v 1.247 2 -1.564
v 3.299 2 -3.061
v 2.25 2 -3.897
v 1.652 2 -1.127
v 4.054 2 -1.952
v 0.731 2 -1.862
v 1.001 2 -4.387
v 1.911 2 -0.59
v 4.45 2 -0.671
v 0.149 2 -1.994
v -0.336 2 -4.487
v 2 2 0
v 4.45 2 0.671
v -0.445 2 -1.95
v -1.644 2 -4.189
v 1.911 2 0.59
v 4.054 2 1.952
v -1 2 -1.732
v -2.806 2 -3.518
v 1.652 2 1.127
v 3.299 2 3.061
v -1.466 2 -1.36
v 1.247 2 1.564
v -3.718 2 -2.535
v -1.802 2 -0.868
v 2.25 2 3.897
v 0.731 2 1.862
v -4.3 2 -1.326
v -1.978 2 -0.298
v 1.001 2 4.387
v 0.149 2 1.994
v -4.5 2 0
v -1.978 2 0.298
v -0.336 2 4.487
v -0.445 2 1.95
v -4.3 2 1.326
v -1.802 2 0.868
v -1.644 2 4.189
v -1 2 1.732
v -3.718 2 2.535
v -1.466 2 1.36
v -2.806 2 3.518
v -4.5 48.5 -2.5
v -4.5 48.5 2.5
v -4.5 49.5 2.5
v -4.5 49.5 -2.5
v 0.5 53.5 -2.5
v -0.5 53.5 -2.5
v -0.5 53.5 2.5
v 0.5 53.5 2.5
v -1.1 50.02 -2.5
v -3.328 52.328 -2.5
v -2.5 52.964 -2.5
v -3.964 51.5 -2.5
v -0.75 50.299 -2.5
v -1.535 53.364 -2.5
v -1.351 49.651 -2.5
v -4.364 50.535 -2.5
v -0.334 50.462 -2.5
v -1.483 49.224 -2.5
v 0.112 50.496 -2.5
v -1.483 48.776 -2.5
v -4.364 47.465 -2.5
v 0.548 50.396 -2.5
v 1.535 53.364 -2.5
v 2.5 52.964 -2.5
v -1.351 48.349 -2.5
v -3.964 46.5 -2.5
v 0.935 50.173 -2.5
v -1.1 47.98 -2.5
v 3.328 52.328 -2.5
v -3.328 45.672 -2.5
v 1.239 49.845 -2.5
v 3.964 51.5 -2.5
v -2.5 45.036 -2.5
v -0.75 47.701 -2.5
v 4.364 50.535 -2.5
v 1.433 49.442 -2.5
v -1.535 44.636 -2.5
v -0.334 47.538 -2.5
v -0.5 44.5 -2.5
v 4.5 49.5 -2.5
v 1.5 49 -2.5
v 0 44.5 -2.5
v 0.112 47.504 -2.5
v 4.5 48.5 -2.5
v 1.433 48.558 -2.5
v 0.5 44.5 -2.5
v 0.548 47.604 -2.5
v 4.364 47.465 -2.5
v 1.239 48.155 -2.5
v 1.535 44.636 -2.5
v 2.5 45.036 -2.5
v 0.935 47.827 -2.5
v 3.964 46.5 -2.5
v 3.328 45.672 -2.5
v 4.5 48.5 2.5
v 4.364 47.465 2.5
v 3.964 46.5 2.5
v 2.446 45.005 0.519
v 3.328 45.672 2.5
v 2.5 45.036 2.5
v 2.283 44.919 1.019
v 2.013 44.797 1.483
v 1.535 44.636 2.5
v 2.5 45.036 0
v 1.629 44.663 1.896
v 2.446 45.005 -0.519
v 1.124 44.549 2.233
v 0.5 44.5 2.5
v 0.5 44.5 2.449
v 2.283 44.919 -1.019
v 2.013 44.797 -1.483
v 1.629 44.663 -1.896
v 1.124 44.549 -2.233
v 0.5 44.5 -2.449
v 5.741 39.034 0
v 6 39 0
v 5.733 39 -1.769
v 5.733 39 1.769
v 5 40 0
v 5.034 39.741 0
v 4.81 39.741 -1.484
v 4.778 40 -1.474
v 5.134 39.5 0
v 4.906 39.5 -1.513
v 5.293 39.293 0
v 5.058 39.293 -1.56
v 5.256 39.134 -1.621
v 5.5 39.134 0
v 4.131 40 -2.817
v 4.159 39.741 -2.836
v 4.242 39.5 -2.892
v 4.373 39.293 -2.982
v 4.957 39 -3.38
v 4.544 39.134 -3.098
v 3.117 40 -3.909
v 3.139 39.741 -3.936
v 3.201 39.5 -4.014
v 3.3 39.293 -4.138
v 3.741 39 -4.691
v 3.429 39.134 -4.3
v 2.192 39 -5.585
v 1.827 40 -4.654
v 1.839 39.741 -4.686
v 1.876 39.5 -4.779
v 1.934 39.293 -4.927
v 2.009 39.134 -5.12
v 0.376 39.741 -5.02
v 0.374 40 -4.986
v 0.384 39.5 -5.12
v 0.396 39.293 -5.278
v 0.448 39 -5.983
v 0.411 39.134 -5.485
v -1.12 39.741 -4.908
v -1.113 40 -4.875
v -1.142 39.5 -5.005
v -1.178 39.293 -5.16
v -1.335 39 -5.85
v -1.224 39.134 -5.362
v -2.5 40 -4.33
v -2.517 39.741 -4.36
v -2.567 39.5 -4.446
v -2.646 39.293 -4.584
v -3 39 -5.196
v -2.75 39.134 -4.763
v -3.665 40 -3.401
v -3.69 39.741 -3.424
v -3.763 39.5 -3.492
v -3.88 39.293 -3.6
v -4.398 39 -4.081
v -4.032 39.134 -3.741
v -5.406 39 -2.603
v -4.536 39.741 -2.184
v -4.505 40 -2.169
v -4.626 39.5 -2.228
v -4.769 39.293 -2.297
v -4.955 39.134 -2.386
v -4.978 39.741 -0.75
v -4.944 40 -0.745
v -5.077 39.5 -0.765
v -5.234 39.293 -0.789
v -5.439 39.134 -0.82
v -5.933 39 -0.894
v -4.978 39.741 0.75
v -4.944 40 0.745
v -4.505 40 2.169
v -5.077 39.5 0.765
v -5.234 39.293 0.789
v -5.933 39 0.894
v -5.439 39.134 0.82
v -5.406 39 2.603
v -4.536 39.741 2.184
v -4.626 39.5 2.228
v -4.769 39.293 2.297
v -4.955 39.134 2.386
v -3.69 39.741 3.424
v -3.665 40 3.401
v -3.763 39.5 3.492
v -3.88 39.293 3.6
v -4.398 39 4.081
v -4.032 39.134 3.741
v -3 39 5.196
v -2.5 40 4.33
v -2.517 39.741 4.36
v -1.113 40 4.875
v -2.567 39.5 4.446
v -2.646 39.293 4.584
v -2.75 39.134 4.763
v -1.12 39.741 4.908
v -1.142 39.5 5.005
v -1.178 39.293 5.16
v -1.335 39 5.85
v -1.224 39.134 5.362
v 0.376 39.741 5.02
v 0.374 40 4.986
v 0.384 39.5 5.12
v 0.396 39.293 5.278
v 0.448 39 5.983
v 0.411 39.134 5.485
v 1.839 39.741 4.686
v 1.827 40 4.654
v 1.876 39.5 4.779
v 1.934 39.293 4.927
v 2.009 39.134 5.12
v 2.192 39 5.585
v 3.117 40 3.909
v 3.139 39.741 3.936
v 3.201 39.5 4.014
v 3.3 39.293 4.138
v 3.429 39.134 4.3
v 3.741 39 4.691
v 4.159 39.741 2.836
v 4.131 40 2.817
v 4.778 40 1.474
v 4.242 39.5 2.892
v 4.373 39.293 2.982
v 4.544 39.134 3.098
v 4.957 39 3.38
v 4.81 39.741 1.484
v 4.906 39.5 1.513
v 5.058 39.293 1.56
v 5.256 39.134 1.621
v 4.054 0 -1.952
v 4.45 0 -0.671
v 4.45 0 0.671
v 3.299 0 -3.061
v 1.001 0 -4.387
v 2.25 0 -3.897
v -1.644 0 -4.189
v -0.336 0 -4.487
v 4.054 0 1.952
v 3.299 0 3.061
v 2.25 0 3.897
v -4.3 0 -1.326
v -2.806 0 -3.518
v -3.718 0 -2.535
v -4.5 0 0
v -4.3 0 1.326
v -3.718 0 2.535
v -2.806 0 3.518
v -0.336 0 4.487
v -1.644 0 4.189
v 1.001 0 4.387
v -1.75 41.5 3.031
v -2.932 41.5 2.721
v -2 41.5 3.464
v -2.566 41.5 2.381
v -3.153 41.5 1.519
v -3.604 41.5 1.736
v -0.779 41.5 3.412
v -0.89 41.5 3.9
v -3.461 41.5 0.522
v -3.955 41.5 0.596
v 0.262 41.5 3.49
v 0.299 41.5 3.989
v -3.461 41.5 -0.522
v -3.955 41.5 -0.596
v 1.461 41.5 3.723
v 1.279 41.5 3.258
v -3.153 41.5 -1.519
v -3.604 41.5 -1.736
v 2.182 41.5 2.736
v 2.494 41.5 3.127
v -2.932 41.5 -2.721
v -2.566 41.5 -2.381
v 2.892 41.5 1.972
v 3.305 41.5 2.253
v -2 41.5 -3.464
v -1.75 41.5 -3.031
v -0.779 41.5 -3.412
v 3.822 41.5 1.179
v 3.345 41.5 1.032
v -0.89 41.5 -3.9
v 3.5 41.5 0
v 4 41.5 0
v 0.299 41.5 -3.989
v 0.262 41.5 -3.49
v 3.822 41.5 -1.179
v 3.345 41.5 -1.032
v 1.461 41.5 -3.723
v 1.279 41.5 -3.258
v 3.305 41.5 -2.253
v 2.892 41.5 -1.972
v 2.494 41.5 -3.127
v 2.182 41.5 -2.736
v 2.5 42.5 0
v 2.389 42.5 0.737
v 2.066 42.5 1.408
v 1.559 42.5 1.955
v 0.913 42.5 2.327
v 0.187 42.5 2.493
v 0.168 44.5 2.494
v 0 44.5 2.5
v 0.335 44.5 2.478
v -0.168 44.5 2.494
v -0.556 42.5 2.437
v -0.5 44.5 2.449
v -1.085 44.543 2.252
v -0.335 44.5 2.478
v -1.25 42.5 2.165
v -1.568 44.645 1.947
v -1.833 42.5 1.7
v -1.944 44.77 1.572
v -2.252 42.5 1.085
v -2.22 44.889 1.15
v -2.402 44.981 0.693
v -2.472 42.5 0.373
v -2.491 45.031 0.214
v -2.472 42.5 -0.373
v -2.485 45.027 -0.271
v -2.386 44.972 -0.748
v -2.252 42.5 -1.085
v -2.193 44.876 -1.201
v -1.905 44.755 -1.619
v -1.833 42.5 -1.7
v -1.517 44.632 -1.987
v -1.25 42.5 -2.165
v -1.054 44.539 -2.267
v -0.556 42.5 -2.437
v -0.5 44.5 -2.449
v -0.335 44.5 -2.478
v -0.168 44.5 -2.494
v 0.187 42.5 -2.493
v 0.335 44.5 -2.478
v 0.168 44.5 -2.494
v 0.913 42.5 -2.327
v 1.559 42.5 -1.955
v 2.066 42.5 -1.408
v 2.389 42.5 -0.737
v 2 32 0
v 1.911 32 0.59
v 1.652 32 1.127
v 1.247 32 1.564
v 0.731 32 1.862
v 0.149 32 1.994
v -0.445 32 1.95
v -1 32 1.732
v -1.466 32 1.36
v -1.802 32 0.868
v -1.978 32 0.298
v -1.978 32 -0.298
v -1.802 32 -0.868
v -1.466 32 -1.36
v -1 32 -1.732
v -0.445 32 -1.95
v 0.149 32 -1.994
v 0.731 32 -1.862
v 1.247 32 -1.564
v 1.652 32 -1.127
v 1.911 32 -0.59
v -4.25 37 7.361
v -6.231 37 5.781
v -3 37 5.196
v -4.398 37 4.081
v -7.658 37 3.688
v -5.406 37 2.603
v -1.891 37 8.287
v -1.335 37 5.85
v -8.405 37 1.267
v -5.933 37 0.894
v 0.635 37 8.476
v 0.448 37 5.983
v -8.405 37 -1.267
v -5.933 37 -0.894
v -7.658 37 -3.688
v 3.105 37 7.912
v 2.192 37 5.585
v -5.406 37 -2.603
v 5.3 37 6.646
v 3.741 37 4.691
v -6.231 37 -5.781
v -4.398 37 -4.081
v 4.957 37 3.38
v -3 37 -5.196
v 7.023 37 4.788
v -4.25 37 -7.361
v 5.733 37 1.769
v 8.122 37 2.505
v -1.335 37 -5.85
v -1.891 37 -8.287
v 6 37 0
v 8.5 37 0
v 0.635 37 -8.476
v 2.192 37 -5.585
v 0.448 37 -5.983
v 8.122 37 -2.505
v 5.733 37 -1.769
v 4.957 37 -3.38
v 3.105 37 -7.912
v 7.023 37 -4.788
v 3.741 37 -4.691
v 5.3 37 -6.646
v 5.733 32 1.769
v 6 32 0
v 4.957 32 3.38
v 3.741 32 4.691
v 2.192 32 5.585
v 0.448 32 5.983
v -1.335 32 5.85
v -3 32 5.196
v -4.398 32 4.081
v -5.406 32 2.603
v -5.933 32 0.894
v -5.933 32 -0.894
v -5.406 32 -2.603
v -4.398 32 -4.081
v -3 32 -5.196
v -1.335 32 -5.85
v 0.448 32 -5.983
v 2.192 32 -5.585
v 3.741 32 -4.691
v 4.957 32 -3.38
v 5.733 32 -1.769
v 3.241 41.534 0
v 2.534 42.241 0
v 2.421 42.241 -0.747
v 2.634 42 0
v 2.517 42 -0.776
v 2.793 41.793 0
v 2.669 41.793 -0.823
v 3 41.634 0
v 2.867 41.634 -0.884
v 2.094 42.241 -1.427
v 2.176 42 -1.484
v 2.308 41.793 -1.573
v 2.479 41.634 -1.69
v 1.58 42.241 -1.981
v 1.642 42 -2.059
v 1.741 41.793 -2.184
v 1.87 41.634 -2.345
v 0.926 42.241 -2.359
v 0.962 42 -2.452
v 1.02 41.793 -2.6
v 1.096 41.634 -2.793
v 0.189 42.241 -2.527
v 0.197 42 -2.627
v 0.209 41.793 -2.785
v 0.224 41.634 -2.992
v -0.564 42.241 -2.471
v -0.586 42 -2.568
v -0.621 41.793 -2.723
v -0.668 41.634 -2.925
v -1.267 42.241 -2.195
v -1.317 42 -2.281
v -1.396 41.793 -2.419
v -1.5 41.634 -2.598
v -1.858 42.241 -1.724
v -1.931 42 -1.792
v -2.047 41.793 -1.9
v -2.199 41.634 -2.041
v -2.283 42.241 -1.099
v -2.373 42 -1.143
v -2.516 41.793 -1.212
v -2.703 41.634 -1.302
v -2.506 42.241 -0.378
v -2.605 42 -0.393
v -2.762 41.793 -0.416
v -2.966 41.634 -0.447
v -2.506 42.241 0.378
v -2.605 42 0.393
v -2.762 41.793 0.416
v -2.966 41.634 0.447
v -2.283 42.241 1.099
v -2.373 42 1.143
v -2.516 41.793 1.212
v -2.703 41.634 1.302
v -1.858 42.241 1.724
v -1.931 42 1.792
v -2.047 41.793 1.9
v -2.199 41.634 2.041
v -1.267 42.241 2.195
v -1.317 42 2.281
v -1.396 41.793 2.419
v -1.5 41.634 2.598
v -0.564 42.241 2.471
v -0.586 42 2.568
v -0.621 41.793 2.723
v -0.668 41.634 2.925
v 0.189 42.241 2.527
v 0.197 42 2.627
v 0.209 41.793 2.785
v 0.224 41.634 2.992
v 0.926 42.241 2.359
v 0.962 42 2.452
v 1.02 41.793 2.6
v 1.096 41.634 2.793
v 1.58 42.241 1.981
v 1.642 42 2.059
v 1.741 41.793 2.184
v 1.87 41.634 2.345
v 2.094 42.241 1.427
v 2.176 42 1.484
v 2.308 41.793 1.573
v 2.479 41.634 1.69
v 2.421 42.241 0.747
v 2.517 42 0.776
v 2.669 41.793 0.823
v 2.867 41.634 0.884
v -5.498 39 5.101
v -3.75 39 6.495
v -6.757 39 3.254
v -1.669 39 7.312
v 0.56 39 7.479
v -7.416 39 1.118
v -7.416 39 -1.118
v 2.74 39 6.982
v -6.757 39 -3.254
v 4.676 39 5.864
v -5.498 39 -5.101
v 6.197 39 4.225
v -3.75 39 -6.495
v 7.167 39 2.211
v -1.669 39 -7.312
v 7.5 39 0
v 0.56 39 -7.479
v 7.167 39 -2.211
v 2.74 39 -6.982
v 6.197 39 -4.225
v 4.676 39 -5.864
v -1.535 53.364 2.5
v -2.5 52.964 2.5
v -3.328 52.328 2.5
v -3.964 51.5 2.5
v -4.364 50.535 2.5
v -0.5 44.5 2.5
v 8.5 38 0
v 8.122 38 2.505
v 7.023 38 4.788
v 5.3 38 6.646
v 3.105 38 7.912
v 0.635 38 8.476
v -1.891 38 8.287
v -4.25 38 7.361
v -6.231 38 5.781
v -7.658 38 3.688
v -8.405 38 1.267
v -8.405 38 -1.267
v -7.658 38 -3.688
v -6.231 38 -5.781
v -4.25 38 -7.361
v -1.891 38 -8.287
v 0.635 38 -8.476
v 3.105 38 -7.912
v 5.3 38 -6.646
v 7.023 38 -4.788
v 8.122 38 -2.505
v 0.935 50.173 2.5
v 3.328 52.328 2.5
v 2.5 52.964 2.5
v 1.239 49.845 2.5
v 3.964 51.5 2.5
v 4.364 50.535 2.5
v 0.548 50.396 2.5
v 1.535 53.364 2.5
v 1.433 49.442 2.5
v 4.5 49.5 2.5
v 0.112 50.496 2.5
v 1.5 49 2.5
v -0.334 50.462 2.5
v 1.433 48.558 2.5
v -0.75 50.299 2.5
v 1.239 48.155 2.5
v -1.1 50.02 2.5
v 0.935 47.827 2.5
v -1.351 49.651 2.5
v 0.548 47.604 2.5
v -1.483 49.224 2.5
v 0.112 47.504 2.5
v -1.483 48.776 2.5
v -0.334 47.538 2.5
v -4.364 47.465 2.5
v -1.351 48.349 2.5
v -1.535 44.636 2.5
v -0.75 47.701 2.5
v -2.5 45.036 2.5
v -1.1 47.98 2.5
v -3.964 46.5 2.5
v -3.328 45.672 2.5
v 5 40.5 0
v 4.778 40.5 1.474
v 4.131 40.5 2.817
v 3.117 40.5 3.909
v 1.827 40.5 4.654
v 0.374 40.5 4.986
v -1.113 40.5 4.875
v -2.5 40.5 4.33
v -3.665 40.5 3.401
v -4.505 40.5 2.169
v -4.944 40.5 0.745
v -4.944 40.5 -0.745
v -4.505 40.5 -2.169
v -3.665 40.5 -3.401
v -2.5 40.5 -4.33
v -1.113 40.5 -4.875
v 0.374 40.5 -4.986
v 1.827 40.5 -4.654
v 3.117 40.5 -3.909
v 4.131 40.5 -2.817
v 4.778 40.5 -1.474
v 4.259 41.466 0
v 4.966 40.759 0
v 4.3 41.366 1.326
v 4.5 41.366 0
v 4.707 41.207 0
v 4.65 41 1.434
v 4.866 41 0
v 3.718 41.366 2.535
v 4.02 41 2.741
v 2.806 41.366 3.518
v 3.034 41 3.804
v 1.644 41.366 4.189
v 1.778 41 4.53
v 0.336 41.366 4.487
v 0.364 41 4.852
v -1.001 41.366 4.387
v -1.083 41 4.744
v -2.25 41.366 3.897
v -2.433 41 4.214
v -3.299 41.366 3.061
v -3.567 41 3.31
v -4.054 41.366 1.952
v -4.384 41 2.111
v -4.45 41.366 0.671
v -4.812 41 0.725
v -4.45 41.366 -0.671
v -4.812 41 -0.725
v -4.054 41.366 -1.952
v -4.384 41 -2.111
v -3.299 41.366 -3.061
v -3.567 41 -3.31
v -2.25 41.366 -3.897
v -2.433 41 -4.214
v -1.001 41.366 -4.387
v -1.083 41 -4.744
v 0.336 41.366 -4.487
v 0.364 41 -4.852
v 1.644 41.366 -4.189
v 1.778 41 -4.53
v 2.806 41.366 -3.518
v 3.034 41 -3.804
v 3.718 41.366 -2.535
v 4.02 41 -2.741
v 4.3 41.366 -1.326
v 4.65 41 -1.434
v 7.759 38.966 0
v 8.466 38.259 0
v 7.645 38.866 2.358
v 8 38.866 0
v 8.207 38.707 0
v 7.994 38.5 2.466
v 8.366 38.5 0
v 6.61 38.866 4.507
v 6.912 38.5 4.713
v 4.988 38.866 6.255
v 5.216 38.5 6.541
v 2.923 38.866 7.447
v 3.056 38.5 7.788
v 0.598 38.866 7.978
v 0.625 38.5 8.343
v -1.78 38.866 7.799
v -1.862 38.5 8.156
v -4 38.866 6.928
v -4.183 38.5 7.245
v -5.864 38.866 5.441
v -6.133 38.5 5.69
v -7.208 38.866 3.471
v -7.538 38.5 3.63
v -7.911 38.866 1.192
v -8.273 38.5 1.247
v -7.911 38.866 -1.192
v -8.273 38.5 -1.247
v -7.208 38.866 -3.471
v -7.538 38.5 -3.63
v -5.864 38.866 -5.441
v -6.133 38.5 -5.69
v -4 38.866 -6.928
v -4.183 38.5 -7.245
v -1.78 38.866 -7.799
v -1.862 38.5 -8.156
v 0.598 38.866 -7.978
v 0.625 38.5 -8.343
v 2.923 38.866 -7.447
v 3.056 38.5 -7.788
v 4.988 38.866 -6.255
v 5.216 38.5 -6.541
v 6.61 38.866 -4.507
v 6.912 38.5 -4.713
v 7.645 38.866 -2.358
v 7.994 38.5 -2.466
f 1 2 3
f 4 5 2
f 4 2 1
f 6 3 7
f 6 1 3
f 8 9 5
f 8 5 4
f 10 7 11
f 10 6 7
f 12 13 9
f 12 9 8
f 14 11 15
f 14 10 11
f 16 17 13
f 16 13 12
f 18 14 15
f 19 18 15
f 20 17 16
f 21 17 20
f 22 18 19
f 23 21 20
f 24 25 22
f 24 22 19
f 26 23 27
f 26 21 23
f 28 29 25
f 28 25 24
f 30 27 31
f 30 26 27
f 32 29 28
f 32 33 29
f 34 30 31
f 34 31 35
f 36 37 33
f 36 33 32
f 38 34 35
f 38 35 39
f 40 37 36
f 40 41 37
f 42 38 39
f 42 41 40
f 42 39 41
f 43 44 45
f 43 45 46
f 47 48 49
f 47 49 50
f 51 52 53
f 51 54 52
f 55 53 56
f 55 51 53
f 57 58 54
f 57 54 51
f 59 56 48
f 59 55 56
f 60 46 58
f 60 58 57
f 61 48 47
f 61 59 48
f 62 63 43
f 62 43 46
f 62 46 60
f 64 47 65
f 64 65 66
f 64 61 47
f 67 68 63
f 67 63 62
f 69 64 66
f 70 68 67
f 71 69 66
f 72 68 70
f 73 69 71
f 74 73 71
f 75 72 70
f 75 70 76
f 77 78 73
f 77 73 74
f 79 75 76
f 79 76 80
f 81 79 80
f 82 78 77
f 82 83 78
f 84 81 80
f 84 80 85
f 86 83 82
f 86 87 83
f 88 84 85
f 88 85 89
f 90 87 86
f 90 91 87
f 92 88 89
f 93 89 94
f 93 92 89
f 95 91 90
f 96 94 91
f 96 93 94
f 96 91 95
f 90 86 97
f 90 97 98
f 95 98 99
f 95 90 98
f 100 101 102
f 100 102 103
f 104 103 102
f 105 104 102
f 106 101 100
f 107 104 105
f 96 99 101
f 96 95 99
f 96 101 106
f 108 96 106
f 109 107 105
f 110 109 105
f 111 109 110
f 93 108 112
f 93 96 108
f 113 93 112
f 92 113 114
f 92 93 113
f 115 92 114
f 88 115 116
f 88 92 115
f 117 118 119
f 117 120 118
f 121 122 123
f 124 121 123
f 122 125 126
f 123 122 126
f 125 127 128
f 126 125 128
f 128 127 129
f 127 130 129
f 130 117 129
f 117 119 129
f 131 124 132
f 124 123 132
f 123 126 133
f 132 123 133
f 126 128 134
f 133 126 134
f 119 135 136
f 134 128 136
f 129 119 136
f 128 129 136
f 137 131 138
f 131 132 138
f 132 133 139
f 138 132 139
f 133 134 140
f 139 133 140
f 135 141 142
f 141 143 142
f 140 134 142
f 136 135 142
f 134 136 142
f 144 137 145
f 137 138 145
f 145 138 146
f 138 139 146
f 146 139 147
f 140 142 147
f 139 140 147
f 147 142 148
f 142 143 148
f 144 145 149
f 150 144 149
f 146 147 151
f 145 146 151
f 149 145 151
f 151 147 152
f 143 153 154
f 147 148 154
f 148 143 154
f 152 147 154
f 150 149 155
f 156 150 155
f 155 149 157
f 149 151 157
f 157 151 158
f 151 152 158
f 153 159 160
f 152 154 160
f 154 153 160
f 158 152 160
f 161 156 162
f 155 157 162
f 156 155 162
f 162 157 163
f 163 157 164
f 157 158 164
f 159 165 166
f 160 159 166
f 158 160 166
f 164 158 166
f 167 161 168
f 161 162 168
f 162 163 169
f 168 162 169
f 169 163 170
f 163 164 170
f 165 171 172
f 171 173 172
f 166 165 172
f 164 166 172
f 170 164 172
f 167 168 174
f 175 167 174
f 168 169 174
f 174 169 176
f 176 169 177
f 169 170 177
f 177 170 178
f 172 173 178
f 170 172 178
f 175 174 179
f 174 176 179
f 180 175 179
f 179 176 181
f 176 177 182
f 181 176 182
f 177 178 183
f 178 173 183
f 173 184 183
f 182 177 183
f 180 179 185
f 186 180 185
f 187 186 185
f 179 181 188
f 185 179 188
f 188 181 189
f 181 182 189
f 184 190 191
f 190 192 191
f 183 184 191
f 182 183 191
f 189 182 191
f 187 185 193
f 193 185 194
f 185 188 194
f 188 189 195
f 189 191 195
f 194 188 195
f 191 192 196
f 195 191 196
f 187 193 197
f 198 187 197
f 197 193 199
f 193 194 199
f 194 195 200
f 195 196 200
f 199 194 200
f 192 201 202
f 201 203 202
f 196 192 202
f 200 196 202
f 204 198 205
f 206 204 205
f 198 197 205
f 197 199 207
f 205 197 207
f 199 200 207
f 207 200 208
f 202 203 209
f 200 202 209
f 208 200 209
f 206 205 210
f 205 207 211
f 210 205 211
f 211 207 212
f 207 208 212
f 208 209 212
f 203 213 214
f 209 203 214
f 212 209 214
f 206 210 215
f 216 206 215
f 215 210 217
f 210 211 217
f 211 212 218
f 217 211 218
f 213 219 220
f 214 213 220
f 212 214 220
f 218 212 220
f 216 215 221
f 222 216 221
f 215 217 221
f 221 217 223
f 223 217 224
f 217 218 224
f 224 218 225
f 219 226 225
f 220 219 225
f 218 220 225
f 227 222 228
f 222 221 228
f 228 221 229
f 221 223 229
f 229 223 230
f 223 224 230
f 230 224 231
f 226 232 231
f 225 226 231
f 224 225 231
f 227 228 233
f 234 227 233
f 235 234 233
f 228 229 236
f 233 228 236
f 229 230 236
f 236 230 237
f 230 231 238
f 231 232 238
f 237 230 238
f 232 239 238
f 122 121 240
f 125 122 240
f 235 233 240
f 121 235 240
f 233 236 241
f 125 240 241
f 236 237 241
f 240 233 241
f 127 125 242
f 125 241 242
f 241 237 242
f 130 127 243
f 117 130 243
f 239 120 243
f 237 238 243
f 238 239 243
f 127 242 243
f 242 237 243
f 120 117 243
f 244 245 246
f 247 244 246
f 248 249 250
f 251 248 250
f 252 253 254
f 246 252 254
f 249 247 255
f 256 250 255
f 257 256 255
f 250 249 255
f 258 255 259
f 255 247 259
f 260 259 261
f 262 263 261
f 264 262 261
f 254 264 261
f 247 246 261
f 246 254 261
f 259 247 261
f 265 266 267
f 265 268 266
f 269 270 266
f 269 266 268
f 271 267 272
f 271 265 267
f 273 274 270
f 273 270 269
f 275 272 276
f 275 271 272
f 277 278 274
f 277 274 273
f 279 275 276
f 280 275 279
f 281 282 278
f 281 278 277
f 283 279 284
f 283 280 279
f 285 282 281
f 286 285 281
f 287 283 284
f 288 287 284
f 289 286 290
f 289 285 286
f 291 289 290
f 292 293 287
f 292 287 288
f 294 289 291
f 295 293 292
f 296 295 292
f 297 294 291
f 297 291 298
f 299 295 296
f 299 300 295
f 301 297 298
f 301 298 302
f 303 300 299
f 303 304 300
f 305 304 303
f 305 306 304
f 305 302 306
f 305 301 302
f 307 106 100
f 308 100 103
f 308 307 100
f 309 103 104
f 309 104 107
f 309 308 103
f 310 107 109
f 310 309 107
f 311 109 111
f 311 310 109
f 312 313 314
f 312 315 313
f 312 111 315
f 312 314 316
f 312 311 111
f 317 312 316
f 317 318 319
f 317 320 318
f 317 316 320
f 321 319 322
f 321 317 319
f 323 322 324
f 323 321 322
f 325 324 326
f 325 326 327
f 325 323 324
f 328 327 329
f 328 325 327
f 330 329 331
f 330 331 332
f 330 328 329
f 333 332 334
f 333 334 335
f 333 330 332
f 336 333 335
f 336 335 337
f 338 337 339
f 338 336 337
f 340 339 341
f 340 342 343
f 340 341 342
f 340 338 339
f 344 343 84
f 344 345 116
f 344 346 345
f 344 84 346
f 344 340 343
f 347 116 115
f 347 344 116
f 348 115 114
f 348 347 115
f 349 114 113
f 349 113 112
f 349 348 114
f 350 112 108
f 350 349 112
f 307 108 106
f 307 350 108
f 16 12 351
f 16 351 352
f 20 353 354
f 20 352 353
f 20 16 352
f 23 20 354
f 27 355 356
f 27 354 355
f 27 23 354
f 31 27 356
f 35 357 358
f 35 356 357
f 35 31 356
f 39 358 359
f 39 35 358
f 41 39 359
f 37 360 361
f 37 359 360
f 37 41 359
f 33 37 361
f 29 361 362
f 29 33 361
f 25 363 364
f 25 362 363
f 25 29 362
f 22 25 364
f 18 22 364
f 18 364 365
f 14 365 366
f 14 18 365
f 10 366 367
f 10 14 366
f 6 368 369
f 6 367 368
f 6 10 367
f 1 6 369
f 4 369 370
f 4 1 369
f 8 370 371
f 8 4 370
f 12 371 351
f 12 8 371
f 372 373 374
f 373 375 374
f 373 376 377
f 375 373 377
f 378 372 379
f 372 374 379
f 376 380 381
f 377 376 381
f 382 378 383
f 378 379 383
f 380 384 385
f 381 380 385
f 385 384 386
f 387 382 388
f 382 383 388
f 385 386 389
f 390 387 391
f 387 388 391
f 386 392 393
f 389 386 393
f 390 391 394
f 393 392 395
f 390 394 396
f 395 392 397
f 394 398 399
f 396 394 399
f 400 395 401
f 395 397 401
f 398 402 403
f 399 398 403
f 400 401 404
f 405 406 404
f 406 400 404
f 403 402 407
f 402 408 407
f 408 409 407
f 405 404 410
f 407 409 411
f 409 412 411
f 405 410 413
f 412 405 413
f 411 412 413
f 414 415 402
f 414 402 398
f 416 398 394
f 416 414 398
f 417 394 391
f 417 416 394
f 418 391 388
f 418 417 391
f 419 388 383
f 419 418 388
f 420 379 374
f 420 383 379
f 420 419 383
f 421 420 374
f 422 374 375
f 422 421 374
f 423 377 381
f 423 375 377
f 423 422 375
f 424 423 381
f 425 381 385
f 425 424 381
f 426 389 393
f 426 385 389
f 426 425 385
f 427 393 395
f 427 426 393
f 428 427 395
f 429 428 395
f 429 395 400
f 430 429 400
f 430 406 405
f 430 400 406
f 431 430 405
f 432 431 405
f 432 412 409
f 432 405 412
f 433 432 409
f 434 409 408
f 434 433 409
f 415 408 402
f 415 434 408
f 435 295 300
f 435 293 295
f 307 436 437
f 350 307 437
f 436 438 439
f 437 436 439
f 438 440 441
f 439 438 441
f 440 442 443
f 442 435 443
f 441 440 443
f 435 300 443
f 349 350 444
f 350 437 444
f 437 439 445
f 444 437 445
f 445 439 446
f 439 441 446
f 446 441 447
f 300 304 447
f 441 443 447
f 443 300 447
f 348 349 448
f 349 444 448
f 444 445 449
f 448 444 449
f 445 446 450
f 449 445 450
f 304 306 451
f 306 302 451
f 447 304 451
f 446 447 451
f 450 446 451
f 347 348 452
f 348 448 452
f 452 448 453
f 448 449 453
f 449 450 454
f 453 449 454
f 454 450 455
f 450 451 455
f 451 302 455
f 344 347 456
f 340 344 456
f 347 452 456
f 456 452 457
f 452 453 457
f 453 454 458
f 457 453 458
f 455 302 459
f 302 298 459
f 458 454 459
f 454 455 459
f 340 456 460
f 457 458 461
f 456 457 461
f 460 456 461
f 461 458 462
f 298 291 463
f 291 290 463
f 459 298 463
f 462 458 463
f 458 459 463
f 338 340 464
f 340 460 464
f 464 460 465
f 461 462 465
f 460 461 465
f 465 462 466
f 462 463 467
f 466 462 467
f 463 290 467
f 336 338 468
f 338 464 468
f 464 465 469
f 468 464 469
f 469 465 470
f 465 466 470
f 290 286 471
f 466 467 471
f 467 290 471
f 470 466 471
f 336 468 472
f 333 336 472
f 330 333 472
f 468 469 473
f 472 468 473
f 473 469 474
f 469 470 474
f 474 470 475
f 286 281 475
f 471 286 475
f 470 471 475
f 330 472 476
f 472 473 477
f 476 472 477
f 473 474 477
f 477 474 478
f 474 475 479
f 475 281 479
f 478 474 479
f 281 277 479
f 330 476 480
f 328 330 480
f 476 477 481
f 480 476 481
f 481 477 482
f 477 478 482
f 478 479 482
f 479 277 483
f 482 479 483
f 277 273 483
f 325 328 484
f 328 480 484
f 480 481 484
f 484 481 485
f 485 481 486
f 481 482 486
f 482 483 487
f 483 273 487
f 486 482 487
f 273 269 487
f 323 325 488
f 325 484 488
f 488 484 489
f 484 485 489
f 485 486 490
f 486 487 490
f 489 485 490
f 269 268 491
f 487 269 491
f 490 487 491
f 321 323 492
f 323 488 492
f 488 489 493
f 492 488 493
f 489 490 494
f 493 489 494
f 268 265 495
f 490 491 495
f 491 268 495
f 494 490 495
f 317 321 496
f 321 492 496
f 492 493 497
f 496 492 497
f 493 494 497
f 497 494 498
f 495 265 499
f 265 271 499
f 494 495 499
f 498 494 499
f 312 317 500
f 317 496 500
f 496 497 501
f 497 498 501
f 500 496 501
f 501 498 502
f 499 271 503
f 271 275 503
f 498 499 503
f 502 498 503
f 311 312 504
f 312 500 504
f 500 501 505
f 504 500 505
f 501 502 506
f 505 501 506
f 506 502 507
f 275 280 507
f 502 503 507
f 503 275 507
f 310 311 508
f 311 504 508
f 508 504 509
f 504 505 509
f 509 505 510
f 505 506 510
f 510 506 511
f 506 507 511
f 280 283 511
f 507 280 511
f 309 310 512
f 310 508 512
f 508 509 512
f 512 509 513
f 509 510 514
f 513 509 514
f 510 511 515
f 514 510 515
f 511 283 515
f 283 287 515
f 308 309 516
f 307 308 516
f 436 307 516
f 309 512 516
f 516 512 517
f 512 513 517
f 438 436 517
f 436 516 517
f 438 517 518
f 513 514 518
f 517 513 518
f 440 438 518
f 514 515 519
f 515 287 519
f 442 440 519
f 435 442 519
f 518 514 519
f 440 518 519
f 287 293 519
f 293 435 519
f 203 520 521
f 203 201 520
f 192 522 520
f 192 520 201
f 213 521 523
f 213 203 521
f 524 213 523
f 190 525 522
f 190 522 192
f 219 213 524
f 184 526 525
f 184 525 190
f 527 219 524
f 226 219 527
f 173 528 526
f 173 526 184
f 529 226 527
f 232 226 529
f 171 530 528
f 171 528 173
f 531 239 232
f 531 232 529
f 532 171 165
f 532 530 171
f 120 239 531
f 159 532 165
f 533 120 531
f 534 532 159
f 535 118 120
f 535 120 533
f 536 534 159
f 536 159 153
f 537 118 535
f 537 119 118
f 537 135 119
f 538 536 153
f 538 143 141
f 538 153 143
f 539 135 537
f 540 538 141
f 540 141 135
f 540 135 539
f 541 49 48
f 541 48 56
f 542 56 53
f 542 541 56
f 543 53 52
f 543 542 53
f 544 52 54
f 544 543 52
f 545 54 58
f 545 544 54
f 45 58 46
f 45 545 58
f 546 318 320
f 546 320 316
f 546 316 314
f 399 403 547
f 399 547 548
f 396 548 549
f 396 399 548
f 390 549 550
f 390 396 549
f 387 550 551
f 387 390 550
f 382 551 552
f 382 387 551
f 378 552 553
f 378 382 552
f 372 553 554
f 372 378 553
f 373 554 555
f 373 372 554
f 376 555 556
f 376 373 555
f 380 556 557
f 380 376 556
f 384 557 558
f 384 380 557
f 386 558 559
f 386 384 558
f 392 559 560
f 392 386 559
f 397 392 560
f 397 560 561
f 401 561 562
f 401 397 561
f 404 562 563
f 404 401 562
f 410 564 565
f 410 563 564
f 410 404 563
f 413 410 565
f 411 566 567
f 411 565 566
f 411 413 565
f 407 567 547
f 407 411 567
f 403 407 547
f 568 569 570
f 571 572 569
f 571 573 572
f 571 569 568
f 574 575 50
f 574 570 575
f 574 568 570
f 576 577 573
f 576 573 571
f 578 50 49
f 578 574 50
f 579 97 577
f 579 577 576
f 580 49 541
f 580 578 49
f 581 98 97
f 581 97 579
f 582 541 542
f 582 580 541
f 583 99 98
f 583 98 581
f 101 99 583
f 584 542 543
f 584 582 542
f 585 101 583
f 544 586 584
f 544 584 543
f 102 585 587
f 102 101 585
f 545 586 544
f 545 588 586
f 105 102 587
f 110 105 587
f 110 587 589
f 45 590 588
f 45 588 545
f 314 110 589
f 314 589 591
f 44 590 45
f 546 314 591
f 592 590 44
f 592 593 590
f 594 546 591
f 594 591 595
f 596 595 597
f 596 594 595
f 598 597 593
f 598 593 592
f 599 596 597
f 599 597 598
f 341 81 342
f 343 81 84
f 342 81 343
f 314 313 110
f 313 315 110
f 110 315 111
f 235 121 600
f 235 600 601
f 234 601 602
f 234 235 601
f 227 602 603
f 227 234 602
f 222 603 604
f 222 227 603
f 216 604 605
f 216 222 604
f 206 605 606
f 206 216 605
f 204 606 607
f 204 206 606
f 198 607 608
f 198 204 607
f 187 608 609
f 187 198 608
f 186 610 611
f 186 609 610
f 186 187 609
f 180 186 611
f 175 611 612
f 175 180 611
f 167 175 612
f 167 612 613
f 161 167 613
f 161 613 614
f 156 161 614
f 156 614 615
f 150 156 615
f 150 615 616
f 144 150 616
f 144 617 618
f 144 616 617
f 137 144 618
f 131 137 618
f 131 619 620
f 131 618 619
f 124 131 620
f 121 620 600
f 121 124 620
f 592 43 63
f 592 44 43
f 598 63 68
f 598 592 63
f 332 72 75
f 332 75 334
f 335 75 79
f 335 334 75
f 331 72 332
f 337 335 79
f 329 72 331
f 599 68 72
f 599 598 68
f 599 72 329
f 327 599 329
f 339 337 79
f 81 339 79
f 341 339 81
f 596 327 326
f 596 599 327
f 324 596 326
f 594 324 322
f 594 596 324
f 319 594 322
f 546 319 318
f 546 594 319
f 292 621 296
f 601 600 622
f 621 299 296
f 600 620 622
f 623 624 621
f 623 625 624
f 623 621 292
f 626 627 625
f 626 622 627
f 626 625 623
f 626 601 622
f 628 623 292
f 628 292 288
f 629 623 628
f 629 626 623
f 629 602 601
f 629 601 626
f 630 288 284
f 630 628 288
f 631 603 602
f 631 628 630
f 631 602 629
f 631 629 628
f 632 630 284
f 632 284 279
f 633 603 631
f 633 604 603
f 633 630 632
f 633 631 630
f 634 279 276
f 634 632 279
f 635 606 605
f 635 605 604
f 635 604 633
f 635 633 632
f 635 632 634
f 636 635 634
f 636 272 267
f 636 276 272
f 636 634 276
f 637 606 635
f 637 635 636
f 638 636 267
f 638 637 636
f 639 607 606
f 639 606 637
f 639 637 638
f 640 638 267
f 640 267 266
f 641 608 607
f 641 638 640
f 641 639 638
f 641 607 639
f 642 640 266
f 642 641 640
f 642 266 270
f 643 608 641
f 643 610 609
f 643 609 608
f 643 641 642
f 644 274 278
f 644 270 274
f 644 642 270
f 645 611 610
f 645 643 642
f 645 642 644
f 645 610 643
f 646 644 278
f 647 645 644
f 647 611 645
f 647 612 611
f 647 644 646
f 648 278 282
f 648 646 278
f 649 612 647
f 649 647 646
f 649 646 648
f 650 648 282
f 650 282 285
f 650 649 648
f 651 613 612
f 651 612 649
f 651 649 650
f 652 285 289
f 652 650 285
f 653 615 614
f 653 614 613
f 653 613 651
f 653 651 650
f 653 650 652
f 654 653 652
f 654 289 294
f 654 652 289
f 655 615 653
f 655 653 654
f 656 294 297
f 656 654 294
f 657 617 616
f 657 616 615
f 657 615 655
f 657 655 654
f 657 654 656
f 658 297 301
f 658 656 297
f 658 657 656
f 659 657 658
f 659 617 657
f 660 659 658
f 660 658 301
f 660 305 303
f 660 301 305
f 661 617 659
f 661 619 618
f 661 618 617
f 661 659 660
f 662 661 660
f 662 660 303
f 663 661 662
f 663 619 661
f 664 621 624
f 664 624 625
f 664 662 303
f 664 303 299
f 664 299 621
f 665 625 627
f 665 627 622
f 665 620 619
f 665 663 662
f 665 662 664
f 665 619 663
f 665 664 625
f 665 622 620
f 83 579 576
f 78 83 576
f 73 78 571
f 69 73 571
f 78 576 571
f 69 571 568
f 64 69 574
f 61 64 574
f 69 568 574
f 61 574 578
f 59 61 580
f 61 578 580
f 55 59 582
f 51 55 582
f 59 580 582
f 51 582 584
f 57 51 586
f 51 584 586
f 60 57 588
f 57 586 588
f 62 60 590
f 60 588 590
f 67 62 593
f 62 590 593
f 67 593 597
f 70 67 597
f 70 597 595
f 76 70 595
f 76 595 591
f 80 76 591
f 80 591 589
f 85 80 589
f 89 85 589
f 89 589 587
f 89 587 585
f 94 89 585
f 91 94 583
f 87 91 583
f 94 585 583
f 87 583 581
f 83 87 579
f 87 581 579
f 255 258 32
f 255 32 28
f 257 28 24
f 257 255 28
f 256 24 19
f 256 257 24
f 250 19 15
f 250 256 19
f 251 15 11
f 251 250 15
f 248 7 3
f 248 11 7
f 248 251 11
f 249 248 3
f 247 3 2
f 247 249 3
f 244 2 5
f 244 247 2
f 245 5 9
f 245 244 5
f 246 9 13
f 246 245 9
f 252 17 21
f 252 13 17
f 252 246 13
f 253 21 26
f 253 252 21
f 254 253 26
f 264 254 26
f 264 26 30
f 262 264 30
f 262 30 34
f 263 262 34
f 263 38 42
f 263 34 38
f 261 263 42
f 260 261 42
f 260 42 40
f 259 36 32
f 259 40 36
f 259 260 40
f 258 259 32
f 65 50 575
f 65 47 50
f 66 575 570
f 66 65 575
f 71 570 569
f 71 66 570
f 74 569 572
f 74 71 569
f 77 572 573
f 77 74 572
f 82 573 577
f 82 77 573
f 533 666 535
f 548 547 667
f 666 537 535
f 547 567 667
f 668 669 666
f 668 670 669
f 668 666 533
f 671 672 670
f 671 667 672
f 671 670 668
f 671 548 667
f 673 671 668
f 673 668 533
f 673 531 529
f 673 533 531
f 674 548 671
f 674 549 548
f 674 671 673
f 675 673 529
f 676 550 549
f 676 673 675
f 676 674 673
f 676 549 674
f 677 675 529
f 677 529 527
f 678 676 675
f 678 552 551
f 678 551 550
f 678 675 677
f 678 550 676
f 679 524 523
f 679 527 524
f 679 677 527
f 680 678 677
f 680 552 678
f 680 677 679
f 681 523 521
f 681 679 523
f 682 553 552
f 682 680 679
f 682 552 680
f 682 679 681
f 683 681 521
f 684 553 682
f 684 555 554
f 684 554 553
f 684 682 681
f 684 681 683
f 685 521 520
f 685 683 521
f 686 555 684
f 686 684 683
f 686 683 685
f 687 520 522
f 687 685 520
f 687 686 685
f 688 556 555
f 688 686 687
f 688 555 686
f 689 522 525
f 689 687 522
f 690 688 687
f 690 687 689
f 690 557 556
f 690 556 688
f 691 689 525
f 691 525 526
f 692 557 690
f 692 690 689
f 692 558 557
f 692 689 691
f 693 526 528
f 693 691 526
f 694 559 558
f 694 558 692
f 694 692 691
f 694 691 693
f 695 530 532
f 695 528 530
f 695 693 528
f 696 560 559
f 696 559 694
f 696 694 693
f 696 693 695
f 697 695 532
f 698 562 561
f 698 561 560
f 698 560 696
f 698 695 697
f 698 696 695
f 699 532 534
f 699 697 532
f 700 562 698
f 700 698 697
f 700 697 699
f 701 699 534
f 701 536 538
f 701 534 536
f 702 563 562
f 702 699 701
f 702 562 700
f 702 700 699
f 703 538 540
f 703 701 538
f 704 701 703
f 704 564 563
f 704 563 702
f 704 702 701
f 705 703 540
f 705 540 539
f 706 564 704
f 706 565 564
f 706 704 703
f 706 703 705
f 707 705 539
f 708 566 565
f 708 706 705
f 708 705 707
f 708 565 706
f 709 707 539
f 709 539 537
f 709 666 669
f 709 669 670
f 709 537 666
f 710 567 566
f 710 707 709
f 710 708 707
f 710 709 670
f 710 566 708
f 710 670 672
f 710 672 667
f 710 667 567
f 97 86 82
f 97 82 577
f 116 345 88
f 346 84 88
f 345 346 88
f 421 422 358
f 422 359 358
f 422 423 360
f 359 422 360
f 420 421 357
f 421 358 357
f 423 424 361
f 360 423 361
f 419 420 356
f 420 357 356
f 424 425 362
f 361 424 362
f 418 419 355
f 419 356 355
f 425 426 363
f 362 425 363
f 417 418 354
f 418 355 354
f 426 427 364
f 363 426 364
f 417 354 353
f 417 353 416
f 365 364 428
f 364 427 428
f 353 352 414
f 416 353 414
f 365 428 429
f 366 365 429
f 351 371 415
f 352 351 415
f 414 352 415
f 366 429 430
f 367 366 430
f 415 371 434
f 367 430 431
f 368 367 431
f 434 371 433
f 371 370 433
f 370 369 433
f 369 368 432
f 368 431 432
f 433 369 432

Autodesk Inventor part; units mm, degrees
ref_plane "YZ Plane" through (0, 0, 0) normal (1, 0, 0) x (0, 1, 0)
ref_plane "XZ Plane" through (0, 0, 0) normal (0, 1, 0) x (-1, 0, 0)
ref_plane "XY Plane" through (0, 0, 0) normal (0, 0, 1) x (1, 0, 0)
sketch "Szkic1" plane through (0, 0, 0) normal (0, 1, 0) x (-1, 0, 0)
  circle A0 centre (0, 0) radius 4.5
  dimension "d0" = 9
extrude "Wyciągnięcie proste1" add sketch "Szkic1" along normal blind 2
sketch "Szkic2" plane through (0, 2, 0) normal (0, 1, 0) x (1, 0, 0)
  circle A0 centre (0, 0) radius 2
  dimension "d3" = 4
extrude "Wyciągnięcie proste2" add sketch "Szkic2" along normal blind 30
sketch "Szkic3" plane through (0, 32, 0) normal (0, 1, 0) x (1, 0, 0)
  circle A0 centre (0, 0) radius 6
  dimension "d6" = 12
extrude "Wyciągnięcie proste3" add sketch "Szkic3" along normal blind 5
sketch "Szkic4" plane through (0, 37, 0) normal (0, 1, 0) x (1, 0, 0)
  circle A0 centre (0, 0) radius 8.5
  dimension "d9" = 17
extrude "Wyciągnięcie proste4" add sketch "Szkic4" along normal blind 2
sketch "Szkic5" plane through (0, 39, 0) normal (0, 1, 0) x (1, 0, 0)
  circle A0 centre (0, 0) radius 5
  dimension "d12" = 10
extrude "Wyciągnięcie proste5" add sketch "Szkic5" along normal blind 2.5
sketch "Szkic6" plane through (0, 41.5, 0) normal (0, 1, 0) x (1, 0, 0)
  circle A0 centre (0, 0) radius 2.5
  dimension "d15" = 5
extrude "Wyciągnięcie proste6" add sketch "Szkic6" along normal blind 3
sketch "Szkic7" plane through (0, 44.5, 0) normal (0, 1, 0) x (1, 0, 0)
  line L0 (4.5, -2.5) -> (-4.5, -2.5)
  line L1 (-4.5, -2.5) -> (-4.5, 2.5)
  line L2 (-4.5, 2.5) -> (4.5, 2.5)
  line L3 (4.5, 2.5) -> (4.5, -2.5)
  line L4 (4.5, -2.5) -> (-4.5, 2.5) construction
  line L5 (-4.5, -2.5) -> (4.5, 2.5) construction
  point P0 (0, 0)
  dimension "d18" = 9
  dimension "d19" = 5
extrude "Wyciągnięcie proste7" add sketch "Szkic7" along normal blind 9
fillet "Zaokrąglenie1" radius 4 4 edges at (4.5, 44.5, 0) (4.5, 53.5, 0) (-4.5, 53.5, 0) (-4.5, 44.5, 0)
sketch "Szkic8" plane through (-0.5, 44.5, 2.5) normal (0, 0, 1) x (1, 0, 0)
  line L0 (0, 9) -> (1, 9) projected
  line L1 (-4, 4) -> (-4, 5) projected
  circle A0 centre (0.5, 4.5) radius 1.5
  line L2 (0, 0) -> (0.5, 0) projected
  line L3 (5, 4) -> (5, 5) projected
  point P0 (0.5, -44.5)
  dimension "d23" = 3
  dimension "d26" = 9
  dimension "d27" = 9
  dimension "d28" = 4.5
  dimension "d29" = 4.5
extrude "Wyciągnięcie proste8" cut sketch "Szkic8" against normal blind 10
fillet "Zaokrąglenie2" radius 1 4 edges at (-8.5, 39, 0) (-5, 39, 0) (-5, 41.5, 0) (-2.5, 41.5, 0)
equation "\"d28\" = 0.5 * d26"
equation "\"d29\" = 0.5 * d27"
properties part number "Tlok" material "Aluminum 6061"
